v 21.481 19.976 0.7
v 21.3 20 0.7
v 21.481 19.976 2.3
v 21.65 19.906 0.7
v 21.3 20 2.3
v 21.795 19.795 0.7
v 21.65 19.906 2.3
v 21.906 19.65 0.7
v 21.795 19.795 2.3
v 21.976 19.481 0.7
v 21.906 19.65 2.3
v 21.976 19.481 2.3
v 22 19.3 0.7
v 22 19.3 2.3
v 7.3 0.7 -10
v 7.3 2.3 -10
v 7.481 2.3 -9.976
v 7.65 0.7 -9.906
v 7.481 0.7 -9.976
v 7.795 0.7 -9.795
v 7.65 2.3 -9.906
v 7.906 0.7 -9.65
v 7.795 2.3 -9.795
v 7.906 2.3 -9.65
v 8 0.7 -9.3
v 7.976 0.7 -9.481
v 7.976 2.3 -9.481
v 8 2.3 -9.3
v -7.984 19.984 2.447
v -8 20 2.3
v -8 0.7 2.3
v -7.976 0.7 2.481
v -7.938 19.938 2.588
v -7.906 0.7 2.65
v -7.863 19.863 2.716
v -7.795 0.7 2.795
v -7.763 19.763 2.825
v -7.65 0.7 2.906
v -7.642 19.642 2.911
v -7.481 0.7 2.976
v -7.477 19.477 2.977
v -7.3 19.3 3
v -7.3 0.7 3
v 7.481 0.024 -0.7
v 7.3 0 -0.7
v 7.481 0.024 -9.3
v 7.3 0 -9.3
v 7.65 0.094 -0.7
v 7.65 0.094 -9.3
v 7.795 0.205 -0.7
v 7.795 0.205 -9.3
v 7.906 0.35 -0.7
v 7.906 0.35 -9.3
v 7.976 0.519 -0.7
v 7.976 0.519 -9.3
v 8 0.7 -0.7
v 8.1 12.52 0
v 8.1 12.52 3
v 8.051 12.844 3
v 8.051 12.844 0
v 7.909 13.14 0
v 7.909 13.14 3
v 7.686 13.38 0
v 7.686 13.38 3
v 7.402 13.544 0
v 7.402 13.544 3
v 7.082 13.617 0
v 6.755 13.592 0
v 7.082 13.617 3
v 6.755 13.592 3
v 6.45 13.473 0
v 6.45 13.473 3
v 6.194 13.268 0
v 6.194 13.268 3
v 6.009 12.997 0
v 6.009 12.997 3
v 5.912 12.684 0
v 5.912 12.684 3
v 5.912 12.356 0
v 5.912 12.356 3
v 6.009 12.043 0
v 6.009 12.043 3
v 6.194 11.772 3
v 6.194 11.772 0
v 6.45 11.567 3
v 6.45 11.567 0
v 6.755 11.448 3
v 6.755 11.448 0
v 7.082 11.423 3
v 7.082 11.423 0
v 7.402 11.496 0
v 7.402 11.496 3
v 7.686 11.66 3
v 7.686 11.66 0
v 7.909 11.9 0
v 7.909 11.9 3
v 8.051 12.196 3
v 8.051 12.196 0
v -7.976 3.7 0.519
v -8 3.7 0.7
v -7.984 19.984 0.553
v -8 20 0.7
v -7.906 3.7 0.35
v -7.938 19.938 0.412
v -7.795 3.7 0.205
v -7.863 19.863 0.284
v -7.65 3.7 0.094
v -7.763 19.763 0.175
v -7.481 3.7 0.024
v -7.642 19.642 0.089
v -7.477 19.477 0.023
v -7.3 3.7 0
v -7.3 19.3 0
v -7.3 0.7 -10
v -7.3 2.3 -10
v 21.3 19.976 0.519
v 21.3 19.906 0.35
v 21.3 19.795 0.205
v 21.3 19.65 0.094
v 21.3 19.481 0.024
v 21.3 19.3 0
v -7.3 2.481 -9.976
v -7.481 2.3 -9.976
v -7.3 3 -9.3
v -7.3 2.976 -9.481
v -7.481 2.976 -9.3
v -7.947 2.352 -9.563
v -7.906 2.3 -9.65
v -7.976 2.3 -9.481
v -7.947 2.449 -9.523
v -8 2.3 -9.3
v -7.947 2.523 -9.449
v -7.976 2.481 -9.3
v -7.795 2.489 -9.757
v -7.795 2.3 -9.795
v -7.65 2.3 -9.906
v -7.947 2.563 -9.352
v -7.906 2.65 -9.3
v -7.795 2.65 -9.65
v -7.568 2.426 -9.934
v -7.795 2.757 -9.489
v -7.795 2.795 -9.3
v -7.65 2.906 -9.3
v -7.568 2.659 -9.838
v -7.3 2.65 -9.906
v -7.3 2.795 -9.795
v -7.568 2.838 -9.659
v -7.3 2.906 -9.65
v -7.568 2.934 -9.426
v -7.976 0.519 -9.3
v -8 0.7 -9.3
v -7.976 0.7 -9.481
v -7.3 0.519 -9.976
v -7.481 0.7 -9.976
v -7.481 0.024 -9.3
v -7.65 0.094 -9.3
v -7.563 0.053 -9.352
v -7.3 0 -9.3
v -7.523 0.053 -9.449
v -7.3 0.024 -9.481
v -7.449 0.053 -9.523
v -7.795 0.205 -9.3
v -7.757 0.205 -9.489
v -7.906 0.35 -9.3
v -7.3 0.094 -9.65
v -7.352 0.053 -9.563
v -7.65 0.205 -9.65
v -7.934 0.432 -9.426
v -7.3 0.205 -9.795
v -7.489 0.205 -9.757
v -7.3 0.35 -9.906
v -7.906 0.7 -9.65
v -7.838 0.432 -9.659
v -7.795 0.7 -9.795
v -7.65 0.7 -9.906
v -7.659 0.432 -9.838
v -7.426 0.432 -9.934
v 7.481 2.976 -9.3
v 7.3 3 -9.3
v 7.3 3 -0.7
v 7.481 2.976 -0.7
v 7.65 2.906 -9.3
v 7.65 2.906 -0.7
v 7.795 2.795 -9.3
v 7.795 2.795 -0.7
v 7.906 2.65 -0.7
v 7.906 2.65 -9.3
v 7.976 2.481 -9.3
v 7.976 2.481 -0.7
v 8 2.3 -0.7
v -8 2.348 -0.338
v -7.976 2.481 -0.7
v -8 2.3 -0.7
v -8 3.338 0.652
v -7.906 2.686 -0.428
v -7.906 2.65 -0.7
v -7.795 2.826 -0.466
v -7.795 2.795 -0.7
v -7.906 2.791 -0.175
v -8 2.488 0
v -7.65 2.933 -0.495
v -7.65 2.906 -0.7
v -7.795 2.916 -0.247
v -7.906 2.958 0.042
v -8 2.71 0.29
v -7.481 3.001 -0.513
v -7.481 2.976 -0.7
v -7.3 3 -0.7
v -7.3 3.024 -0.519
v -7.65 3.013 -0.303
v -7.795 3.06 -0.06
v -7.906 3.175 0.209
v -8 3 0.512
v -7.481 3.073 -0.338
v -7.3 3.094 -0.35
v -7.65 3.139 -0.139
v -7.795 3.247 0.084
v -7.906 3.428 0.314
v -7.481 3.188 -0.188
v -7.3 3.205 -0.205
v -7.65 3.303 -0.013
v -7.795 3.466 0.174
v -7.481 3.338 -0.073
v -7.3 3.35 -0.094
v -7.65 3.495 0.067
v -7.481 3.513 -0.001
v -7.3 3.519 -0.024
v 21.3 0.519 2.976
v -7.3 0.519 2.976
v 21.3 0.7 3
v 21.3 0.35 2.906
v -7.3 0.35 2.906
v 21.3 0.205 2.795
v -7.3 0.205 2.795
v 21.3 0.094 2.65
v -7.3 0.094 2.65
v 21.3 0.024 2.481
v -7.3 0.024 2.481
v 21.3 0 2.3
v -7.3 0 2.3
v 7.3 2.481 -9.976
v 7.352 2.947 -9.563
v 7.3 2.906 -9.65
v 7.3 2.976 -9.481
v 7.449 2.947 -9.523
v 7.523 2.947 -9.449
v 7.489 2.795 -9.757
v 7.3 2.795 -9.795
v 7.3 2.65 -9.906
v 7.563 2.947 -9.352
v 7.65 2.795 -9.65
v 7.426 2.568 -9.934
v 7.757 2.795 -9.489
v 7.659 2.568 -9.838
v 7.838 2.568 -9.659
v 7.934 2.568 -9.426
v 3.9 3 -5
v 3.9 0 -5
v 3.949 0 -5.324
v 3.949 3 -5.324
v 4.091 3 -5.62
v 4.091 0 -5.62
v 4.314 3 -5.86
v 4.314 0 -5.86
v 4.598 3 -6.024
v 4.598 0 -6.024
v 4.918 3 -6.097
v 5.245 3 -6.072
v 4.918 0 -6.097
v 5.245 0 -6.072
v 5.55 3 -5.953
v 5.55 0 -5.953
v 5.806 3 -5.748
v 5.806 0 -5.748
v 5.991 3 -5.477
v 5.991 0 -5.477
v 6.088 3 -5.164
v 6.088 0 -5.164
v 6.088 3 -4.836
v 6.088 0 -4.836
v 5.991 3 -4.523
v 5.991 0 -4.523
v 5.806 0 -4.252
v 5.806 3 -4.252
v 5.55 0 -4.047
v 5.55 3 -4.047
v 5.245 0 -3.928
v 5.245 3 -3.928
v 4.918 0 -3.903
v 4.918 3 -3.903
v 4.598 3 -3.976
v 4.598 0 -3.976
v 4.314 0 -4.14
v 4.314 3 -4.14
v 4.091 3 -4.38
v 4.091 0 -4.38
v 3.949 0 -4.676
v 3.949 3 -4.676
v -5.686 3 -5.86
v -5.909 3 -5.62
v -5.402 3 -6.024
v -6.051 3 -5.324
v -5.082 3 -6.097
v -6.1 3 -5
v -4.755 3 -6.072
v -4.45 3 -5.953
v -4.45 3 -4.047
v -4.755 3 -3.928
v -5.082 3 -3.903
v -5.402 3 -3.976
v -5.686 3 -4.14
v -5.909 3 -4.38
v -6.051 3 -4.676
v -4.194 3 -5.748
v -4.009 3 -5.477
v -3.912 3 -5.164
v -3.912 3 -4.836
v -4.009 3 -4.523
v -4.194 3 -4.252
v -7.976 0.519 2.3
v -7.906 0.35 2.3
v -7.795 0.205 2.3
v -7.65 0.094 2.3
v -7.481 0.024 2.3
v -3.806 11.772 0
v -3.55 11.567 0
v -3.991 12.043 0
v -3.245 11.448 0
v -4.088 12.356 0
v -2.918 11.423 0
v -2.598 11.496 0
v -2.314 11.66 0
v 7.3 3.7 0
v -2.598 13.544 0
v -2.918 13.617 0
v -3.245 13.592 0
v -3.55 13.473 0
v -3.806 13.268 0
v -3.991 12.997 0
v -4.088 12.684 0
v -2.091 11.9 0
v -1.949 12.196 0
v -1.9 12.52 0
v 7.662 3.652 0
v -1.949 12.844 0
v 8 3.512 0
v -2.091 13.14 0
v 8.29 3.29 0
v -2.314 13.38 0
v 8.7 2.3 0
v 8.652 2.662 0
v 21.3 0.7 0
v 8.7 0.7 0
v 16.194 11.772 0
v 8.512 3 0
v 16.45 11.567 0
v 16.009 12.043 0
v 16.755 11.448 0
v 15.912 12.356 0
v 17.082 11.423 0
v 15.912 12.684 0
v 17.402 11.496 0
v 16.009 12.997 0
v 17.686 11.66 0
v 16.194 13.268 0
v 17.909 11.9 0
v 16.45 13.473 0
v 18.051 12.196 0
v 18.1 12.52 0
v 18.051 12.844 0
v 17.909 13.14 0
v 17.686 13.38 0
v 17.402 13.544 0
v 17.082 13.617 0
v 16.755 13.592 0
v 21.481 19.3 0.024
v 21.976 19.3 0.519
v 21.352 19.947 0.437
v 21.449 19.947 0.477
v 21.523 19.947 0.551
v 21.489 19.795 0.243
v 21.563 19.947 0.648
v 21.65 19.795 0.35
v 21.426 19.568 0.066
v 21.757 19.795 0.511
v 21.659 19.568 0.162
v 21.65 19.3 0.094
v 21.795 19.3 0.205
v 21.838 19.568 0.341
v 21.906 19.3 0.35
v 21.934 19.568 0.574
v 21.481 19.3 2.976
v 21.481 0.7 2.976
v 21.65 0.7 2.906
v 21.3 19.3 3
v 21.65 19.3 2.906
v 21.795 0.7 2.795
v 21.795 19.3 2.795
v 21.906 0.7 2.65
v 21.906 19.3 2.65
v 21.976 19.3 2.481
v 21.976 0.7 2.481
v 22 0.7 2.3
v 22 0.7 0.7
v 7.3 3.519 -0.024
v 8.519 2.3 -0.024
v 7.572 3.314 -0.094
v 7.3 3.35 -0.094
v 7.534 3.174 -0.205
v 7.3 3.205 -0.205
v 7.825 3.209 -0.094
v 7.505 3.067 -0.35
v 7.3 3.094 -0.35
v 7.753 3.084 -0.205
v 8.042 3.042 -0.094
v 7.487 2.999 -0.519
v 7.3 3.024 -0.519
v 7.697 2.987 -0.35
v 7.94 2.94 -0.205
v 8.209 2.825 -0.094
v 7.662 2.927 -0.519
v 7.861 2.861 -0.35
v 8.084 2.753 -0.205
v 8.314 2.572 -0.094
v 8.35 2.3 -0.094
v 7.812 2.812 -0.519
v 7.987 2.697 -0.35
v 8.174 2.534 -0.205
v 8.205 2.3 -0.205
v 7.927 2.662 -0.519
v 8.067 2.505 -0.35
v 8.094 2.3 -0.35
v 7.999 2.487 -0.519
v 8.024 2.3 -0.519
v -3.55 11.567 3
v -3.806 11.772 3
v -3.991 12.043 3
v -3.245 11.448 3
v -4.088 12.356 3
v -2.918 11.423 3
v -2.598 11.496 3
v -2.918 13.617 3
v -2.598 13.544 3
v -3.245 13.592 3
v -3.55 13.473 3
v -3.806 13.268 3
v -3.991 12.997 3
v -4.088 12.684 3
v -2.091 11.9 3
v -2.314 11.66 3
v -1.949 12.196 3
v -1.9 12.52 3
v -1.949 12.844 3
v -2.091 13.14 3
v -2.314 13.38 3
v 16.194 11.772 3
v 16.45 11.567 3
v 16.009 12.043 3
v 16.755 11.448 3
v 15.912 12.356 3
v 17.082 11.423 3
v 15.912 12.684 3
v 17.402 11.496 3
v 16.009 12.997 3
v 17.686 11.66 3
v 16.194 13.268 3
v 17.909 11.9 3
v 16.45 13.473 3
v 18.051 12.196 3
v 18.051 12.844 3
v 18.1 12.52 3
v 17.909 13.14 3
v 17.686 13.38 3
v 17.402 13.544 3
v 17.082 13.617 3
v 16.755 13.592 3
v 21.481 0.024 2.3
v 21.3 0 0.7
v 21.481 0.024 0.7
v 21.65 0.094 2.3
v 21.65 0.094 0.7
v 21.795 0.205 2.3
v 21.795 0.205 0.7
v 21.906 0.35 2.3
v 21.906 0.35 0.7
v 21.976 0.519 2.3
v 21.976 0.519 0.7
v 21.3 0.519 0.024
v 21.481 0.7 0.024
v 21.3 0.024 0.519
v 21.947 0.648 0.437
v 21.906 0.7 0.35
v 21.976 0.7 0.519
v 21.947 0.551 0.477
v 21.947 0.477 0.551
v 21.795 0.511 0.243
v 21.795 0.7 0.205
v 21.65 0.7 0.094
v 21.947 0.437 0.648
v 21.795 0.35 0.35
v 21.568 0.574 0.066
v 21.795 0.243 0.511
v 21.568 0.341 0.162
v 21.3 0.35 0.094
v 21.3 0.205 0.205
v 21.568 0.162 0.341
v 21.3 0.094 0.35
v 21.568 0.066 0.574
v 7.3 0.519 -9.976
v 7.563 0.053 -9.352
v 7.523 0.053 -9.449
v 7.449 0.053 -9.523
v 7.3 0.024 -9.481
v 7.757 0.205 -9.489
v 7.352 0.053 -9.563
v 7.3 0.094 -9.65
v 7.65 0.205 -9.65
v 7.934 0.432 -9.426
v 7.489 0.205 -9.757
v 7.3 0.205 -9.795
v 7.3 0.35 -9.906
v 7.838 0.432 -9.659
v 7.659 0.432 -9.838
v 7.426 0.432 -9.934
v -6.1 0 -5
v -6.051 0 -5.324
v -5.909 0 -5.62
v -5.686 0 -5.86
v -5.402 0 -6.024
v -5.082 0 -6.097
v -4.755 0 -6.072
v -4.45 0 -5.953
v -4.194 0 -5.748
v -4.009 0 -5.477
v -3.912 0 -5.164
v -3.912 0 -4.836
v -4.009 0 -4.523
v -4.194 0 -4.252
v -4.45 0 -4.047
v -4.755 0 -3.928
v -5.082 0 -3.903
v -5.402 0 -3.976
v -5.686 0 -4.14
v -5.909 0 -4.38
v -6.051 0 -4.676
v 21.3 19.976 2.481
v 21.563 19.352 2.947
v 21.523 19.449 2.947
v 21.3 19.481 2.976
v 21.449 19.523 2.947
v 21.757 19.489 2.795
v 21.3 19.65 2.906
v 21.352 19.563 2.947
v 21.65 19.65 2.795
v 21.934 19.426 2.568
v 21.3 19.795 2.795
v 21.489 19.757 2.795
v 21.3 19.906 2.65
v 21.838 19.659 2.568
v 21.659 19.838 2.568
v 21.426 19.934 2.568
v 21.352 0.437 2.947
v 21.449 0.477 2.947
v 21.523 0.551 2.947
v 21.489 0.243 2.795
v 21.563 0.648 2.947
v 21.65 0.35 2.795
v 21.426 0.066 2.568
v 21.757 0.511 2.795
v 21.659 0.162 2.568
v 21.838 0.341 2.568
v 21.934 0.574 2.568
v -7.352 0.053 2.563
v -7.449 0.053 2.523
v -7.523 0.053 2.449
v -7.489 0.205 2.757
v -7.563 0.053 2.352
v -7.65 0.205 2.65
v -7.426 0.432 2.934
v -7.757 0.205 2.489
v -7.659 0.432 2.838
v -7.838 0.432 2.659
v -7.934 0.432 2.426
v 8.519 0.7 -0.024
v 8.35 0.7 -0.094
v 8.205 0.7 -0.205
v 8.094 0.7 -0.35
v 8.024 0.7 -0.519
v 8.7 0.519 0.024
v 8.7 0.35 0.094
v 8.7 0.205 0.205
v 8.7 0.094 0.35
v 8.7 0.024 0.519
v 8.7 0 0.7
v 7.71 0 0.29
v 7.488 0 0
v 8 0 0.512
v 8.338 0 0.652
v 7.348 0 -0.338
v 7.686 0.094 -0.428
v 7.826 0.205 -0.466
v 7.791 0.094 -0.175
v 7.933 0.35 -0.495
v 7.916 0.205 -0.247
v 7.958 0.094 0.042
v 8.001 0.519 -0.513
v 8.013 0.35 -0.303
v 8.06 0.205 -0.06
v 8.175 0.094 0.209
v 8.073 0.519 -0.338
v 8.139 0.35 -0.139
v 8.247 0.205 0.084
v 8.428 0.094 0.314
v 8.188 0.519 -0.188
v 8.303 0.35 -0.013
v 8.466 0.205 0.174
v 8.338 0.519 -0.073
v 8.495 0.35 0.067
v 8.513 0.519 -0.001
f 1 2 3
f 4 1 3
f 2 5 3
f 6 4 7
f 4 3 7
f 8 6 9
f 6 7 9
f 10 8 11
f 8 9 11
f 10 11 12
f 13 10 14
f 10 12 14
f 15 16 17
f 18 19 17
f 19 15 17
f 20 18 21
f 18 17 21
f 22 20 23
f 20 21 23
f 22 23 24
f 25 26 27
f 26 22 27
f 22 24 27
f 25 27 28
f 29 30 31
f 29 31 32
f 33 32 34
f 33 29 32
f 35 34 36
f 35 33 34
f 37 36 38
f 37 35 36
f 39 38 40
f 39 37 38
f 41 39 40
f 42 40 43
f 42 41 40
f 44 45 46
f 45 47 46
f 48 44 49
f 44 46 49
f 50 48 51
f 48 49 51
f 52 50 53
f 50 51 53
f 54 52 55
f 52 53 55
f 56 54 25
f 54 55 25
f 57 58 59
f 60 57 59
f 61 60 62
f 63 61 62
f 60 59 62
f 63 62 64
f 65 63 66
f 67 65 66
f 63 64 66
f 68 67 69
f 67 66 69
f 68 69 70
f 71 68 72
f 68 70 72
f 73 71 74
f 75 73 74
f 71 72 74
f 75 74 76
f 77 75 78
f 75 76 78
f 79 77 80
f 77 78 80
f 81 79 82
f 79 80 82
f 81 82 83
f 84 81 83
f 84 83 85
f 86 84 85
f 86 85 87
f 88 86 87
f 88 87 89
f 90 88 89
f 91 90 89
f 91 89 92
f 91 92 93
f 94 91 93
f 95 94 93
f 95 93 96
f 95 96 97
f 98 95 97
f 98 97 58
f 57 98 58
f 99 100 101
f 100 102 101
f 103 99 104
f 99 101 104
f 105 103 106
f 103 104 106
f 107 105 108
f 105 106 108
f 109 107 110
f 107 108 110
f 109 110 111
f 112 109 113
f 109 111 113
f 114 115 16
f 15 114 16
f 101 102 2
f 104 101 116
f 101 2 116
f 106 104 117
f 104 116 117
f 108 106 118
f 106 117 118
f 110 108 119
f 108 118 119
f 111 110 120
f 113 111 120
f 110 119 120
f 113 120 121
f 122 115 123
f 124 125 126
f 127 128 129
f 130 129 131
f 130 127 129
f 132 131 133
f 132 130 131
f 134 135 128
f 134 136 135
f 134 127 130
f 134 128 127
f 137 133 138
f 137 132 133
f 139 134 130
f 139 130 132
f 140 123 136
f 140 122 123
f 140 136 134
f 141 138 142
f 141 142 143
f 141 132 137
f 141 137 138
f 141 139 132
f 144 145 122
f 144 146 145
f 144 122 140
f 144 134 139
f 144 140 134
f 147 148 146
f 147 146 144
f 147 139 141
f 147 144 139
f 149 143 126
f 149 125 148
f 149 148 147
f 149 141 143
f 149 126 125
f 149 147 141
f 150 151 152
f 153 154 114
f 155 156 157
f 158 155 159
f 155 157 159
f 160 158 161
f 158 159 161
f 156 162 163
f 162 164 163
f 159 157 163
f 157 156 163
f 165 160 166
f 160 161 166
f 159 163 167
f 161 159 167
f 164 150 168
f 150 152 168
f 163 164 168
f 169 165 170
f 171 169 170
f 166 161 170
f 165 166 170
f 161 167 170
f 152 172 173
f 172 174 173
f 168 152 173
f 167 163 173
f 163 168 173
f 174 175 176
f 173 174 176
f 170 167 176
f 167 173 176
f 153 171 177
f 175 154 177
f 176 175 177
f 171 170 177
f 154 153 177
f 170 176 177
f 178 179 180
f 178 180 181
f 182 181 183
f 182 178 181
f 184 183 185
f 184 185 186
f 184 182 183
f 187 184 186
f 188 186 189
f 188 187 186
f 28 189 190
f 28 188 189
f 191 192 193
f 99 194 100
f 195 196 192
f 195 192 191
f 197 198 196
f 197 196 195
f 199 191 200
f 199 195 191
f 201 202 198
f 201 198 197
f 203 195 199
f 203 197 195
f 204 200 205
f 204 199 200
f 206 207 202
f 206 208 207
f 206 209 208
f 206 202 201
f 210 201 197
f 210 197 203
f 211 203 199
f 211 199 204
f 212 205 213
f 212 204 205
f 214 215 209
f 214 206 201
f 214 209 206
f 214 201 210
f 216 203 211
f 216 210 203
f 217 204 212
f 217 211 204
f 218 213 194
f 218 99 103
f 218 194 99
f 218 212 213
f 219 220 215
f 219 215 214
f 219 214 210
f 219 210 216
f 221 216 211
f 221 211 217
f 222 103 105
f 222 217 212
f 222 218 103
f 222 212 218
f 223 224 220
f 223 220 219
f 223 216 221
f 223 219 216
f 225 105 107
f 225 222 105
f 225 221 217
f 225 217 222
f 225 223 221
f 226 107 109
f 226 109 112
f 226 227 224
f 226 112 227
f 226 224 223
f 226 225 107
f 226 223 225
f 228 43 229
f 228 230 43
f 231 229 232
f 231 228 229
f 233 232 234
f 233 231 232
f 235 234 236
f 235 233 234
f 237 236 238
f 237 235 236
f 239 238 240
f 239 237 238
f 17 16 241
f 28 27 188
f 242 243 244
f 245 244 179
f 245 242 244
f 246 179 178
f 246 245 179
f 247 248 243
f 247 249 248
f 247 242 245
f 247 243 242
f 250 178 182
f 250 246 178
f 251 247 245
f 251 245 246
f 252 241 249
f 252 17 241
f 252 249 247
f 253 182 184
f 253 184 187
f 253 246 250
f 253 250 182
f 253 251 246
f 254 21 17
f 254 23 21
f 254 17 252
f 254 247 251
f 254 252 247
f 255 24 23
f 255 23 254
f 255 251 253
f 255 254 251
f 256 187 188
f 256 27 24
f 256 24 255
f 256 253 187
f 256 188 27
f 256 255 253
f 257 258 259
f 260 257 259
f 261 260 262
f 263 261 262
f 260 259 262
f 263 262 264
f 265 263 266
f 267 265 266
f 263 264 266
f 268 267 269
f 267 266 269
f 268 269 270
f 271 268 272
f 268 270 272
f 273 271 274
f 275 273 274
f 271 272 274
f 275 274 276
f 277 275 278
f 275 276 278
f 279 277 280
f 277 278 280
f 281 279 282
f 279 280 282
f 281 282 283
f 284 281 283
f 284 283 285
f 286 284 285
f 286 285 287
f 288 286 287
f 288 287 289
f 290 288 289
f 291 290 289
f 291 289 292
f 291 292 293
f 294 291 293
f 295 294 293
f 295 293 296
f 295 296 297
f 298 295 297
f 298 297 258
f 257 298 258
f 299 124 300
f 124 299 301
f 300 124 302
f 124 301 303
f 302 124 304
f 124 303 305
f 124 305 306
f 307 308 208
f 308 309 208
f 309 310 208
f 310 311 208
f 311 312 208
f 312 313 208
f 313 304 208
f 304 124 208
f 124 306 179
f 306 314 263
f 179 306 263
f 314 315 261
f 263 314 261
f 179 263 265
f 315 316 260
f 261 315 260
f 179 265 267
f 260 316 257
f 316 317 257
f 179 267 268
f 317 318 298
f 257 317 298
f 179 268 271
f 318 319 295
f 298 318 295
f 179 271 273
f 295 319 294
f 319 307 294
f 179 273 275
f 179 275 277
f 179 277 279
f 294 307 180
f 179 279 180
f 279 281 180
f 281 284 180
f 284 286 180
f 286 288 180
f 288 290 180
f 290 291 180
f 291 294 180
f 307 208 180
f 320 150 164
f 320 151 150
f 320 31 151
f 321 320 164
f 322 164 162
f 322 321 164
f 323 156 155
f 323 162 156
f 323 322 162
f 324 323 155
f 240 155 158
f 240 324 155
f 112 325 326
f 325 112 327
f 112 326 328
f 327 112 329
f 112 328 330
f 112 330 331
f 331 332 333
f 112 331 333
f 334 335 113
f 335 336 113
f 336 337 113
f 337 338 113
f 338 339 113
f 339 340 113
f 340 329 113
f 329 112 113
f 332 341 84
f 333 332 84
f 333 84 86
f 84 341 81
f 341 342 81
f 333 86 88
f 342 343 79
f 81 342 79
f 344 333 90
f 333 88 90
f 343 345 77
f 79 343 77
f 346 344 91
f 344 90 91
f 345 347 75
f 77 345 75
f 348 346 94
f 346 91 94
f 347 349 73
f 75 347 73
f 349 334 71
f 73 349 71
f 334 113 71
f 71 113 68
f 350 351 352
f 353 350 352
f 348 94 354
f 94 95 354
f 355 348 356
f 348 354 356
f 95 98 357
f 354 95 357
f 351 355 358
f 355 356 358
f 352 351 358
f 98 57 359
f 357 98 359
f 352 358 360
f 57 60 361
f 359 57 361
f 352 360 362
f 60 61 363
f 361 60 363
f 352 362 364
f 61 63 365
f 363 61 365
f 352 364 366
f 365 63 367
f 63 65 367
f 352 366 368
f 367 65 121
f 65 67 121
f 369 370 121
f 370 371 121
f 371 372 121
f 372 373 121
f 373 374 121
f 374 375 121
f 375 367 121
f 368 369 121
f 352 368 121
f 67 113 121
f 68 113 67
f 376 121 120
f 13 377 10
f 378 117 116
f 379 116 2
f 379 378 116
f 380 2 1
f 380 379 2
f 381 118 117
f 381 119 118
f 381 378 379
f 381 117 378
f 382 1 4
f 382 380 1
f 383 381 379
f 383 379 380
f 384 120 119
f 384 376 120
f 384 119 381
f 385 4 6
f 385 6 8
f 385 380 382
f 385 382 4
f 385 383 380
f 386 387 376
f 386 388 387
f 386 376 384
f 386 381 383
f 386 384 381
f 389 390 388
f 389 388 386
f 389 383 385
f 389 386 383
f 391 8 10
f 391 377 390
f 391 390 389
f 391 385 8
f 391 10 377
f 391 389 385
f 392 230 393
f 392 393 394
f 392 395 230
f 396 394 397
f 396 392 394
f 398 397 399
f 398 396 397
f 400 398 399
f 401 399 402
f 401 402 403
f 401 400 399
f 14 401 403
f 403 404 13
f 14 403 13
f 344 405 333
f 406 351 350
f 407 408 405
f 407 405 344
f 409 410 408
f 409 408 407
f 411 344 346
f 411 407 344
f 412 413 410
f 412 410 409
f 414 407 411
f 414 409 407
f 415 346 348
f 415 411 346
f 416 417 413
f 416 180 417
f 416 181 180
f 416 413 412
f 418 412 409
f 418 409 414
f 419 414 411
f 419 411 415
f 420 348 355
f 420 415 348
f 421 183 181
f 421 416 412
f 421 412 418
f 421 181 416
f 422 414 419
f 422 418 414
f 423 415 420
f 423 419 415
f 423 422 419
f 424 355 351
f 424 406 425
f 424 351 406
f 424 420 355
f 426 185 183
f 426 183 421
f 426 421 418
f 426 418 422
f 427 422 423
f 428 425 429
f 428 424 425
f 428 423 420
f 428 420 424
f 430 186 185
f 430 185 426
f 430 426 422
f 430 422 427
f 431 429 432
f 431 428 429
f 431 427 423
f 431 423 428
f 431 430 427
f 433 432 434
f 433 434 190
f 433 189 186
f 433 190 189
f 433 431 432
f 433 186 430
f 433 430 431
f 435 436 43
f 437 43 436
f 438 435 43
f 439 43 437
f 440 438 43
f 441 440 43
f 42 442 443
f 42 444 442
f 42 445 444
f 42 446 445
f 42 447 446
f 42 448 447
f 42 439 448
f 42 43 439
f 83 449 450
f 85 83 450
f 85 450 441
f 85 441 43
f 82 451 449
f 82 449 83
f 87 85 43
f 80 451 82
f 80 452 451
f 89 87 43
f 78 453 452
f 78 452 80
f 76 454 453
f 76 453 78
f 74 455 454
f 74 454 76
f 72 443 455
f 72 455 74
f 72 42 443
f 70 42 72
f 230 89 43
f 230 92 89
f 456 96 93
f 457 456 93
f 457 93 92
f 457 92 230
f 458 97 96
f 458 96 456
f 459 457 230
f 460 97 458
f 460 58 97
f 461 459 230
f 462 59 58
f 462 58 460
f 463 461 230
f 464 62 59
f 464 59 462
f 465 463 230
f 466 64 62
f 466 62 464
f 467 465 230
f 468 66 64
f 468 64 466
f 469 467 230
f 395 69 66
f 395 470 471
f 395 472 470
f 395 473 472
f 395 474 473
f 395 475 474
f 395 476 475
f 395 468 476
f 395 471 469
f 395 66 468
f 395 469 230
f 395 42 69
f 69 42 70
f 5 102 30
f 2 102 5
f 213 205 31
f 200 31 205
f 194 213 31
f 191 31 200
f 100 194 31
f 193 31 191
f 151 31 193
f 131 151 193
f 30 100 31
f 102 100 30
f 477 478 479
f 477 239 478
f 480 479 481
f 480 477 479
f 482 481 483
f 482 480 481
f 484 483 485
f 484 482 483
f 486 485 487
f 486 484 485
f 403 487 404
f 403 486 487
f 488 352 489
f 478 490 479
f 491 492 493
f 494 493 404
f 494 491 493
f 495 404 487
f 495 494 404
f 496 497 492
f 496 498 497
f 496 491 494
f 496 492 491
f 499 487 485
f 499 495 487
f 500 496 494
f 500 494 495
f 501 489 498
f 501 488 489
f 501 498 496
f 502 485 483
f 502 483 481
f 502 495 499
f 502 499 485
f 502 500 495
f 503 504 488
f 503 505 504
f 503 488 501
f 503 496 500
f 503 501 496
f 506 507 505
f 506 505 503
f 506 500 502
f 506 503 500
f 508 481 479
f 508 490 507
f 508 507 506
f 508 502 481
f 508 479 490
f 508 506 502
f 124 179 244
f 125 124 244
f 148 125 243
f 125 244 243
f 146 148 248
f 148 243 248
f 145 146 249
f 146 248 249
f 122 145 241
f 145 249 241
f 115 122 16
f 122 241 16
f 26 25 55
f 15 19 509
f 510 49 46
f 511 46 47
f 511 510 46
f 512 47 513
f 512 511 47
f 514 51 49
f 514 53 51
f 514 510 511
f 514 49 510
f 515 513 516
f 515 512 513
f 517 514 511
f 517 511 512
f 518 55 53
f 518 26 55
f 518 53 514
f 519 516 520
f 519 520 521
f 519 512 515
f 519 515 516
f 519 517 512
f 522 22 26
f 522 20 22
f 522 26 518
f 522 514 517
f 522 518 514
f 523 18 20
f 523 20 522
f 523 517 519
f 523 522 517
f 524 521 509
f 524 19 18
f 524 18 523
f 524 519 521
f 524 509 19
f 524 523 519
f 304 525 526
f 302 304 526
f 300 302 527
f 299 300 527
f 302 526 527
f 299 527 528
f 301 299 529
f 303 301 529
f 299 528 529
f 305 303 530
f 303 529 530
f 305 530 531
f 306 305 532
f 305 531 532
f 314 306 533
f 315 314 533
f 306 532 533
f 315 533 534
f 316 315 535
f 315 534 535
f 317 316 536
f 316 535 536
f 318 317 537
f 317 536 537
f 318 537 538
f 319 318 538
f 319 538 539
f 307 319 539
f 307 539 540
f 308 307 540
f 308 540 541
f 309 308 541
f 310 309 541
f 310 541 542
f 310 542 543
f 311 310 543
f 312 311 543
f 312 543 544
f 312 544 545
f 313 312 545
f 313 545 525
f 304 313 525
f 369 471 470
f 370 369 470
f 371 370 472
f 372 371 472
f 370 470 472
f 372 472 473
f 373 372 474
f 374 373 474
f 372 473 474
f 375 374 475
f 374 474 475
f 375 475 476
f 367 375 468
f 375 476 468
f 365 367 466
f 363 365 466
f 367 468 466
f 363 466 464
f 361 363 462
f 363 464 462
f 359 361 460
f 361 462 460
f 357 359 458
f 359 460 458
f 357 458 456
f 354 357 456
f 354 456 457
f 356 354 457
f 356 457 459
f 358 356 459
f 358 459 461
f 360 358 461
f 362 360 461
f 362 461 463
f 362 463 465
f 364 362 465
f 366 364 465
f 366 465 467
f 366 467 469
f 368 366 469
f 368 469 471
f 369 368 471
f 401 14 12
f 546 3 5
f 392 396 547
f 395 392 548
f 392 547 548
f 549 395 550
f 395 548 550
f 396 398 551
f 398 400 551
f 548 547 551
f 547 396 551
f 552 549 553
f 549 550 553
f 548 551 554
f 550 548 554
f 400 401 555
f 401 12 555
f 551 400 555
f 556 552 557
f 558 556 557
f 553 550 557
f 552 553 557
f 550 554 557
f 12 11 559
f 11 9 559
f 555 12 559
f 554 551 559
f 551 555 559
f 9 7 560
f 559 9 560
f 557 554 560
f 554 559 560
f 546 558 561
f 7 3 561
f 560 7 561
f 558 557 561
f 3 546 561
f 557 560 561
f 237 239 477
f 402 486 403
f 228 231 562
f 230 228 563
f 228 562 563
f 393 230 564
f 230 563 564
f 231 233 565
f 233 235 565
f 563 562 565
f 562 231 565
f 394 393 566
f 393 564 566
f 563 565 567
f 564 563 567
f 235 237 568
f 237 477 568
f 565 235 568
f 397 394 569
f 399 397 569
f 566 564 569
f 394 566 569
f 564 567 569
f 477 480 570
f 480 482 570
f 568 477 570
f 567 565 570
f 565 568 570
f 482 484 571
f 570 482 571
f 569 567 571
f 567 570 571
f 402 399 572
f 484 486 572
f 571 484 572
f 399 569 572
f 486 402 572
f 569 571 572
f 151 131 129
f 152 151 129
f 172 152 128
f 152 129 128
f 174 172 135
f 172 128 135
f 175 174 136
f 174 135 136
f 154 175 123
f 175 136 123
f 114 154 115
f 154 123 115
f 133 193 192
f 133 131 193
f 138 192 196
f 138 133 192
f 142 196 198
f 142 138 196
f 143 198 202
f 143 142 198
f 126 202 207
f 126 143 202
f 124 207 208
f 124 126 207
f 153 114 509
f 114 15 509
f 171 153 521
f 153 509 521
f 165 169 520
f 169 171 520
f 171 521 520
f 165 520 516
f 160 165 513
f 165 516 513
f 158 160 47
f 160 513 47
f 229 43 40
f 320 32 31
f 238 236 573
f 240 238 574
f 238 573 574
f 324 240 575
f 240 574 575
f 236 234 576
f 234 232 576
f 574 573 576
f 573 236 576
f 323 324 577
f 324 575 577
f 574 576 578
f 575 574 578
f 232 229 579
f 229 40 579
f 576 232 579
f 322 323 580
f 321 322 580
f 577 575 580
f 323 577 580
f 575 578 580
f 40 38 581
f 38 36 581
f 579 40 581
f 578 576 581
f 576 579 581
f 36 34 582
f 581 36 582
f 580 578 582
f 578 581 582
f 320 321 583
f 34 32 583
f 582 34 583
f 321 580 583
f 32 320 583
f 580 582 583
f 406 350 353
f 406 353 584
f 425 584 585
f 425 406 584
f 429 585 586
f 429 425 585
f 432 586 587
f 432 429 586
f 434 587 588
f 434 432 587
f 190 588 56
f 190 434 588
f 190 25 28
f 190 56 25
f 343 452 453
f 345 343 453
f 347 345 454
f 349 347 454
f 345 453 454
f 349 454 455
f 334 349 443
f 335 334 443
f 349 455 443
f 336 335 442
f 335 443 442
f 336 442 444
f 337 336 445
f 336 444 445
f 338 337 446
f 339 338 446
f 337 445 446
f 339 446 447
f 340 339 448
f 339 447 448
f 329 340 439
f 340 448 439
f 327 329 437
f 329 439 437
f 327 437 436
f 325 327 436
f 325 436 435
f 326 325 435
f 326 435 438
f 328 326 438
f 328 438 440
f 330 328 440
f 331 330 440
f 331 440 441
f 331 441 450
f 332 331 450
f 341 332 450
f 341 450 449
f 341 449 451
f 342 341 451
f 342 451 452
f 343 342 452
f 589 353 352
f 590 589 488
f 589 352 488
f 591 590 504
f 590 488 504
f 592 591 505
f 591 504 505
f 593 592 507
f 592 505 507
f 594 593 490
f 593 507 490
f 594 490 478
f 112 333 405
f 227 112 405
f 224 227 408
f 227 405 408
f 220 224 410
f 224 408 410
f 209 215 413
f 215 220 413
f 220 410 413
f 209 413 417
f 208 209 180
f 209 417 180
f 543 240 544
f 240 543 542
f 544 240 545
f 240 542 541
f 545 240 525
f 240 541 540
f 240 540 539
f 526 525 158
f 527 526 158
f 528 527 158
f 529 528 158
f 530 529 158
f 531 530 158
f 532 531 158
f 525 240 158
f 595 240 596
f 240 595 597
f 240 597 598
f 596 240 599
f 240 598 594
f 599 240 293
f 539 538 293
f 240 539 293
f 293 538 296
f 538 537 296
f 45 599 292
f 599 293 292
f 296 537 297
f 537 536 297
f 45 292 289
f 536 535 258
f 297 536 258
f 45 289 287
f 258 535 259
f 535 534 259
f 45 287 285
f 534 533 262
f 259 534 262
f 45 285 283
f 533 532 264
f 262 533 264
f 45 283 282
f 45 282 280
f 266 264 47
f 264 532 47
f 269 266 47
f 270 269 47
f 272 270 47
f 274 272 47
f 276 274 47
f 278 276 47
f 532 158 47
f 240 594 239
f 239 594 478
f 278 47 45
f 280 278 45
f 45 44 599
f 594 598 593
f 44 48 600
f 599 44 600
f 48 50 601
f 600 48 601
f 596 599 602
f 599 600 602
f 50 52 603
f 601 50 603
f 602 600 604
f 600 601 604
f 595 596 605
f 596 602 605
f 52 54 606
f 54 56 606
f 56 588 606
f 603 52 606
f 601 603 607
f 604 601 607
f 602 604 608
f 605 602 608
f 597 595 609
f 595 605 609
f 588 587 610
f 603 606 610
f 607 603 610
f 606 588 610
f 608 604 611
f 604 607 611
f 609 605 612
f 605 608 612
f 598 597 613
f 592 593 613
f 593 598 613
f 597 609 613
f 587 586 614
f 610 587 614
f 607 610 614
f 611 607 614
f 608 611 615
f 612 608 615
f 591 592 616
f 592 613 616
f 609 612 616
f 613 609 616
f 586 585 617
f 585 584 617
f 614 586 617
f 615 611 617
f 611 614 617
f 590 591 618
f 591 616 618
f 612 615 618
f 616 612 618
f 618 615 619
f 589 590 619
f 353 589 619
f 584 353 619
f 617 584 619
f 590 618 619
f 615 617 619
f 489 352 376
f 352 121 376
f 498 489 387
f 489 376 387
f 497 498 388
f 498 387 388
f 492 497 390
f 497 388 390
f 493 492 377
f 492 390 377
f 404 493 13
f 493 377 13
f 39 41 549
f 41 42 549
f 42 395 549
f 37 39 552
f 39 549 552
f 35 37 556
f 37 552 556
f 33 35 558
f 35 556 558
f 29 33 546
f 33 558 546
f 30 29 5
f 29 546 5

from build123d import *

# Parameters (mm, degrees)
SKETCH_1_W              = 16
SKETCH_1_H              = 3
EXTRUDE_1_DEPTH         = 10
SKETCH_2_W              = 30
SKETCH_2_H              = 20
EXTRUDE_2_DEPTH         = 3
HOLE_WIZARD_2_2_2_2_1_D = 2.2
FILLET_1_R              = 0.7
HOLE_WIZARD_2_2_2_2_2_D = 2.2


with BuildPart() as part:
    # 草图1 → 凸台-拉伸1 (new body)
    with BuildSketch(Plane.XY):
        with Locations((0, 1.5)):
            Rectangle(SKETCH_1_W, SKETCH_1_H)
    extrude(amount=-EXTRUDE_1_DEPTH)

    # 草图2 → 凸台-拉伸2 (add)
    with BuildSketch(Plane.XY):
        with Locations((7, 10)):
            Rectangle(SKETCH_2_W, SKETCH_2_H)
    extrude(amount=EXTRUDE_2_DEPTH)

    # Ø2.2 (2.2) 直径孔1 (through all)
    with Locations(Plane(origin=(0, 3, 0), x_dir=(1, 0, 0), z_dir=(0, 1, 0))):
        with Locations((-5, 5), (5, 5)):
            Hole(HOLE_WIZARD_2_2_2_2_1_D / 2)

    # 圆角1
    fillet_1_edges = [part.edges().sort_by_distance(p)[0] for p in [
        (8, 1.5, -10),
        (-8, 11.5, 0),
        (15, 0, 0),
        (22, 10, 0),
        (22, 0, 1.5),
        (7, 20, 0),
        (22, 20, 1.5),
        (-8, 10, 3),
        (7, 0, 3),
        (0, 3, -10),
        (22, 10, 3),
        (7, 20, 3),
        (-8, 1.5, -10),
        (0, 3, 0),
        (8, 1.5, 0),
        (-8, 3, -5),
        (8, 3, -5),
        (8, 0, -5),
        (-8, 0, -3.5),
        (0, 0, -10),
    ]]
    fillet(fillet_1_edges, radius=FILLET_1_R)

    # Ø2.2 (2.2) 直径孔2 (through all)
    with Locations(Plane(origin=(0, 0, 0), x_dir=(-1, 0, 0), z_dir=(0, 0, -1))):
        with Locations((-17, 12.52), (-7, 12.52), (3, 12.52)):
            Hole(HOLE_WIZARD_2_2_2_2_2_D / 2)


solid = part.part
